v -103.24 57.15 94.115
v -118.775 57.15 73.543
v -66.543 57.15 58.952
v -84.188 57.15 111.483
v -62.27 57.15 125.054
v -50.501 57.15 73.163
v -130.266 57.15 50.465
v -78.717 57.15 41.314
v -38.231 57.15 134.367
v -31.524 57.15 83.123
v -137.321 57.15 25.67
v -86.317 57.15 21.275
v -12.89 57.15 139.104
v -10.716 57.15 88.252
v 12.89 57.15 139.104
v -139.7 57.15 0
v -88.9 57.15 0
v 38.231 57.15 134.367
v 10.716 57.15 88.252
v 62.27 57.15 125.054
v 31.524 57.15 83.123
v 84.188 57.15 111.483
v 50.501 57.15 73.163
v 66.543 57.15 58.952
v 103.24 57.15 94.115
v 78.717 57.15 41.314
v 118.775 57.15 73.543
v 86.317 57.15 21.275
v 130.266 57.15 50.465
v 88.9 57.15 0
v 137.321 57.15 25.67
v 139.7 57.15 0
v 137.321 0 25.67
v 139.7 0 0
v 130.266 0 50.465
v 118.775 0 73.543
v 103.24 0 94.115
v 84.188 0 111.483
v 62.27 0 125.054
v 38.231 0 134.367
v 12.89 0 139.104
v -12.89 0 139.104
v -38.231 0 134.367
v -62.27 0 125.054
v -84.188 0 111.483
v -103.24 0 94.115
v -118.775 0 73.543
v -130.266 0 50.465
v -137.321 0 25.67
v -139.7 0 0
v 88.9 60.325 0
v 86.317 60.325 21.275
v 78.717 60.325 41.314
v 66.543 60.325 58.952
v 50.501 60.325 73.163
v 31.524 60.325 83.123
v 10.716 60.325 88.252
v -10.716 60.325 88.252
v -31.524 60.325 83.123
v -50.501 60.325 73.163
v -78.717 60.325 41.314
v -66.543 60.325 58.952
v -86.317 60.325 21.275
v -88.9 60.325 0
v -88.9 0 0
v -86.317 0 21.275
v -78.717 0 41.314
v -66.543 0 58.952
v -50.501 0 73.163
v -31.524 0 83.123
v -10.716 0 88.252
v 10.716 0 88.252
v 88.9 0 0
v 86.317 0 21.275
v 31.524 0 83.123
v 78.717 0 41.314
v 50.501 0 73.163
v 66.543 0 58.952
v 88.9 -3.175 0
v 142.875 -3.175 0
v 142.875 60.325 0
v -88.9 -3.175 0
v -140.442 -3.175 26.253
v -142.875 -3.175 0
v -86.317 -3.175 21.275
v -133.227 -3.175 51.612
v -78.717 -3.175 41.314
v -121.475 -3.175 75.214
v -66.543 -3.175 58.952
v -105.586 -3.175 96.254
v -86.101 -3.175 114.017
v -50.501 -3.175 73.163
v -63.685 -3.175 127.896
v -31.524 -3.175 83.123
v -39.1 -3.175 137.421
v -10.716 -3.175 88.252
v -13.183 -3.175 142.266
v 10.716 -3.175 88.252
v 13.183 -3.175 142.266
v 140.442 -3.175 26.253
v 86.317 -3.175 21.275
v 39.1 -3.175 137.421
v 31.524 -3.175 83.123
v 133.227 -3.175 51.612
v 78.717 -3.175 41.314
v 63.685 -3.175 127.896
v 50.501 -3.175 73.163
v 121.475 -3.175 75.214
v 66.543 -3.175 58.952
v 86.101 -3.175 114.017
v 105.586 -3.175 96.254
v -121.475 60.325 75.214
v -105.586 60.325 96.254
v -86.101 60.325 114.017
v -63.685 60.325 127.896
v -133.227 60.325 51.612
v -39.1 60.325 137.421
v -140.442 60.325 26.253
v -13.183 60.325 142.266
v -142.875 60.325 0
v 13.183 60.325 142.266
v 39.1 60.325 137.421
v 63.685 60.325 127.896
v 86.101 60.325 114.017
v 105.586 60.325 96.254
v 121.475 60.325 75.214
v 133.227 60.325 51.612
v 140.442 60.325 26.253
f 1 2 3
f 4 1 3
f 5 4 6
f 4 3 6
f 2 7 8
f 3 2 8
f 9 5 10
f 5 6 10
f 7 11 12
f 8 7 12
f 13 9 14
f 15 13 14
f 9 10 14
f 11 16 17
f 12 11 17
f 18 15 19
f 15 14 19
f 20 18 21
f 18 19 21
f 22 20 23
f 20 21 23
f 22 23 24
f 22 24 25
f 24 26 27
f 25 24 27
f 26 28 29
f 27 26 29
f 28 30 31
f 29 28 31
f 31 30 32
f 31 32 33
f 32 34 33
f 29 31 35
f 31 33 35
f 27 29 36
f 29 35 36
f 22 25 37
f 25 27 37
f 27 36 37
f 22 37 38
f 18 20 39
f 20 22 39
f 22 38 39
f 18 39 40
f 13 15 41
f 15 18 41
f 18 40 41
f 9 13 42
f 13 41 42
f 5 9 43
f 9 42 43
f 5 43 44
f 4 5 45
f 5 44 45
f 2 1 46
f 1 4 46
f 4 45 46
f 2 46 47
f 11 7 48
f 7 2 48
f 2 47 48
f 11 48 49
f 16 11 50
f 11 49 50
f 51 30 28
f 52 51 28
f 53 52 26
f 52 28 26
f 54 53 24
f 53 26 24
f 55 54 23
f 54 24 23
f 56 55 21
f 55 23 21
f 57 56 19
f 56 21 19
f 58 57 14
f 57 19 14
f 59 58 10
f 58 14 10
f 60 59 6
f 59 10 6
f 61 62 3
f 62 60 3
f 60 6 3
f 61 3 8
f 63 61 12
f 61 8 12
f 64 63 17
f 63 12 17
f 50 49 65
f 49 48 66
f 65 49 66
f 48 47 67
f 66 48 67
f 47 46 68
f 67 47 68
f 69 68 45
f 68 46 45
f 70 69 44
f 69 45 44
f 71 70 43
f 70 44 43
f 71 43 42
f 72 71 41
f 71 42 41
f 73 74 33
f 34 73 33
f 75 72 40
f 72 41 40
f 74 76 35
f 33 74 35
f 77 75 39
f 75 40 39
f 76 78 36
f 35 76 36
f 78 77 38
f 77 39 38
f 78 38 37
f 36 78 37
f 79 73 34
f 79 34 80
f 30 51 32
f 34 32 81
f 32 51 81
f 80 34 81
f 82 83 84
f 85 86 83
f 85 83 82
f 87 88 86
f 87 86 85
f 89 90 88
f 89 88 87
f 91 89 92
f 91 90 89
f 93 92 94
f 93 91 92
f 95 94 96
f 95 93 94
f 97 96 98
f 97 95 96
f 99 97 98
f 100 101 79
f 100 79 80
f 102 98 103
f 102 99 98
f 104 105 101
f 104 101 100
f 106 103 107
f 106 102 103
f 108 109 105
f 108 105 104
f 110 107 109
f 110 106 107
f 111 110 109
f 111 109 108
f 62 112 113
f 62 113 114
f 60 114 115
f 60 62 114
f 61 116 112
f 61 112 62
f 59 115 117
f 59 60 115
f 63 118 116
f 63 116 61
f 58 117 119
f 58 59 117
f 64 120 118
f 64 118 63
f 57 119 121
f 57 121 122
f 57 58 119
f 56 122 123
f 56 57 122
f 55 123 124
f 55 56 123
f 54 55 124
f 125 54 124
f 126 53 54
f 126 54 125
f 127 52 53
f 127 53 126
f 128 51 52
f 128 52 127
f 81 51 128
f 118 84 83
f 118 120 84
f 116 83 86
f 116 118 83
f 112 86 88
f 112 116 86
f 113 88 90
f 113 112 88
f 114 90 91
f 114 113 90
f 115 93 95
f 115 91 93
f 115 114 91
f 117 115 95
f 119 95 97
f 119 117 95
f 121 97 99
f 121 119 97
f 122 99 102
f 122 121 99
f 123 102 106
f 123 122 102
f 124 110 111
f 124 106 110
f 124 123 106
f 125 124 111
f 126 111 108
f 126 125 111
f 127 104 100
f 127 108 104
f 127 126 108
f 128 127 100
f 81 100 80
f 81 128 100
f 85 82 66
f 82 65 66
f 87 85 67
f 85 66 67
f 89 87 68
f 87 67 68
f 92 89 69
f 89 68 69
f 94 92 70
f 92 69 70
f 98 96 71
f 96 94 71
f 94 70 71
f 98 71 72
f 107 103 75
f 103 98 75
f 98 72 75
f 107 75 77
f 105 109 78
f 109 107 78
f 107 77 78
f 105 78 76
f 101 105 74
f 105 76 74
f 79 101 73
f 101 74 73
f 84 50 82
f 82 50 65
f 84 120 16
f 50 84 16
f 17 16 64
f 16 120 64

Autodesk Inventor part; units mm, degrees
ref_plane "YZ Plane" through (0, 0, 0) normal (1, 0, 0) x (0, 1, 0)
ref_plane "XZ Plane" through (0, 0, 0) normal (0, 1, 0) x (-1, 0, 0)
ref_plane "XY Plane" through (0, 0, 0) normal (0, 0, 1) x (1, 0, 0)
sketch "Sketch1" plane through (0, 0, 0) normal (0, 1, 0) x (-1, 0, 0)
  arc A0 (139.7, 0) -> (-139.7, 0) centre (0, 0) ccw
  arc A1 (142.875, 0) -> (-142.875, 0) centre (0, 0) ccw
  line L0 (139.7, 0) -> (142.875, 0)
  line L1 (-139.7, 0) -> (-142.875, 0)
  dimension "d0" = 279.4
  dimension "d1" = 3.175
extrude "Extrusion1" add sketch "Sketch1" along normal blind 57.15
sketch "Sketch2" plane through (0, 57.15, 0) normal (0, 1, 0) x (1, 0, 0)
  arc A0 (-88.9, 0) -> (88.9, 0) centre (0, 0) ccw
  arc A1 (-142.875, 0) -> (142.875, 0) centre (0, 0) ccw projected
  line L0 (-139.7, 0) -> (-142.875, 0) projected
  line L1 (-142.875, 0) -> (-88.9, 0)
  line L2 (88.9, 0) -> (142.875, 0)
  dimension "d4" = 177.8
extrude "Extrusion2" add sketch "Sketch2" along normal blind 3.175
sketch "Sketch3" plane through (0, 0, 0) normal (0, -1, 0) x (1, 0, 0)
  arc A0 (142.875, 0) -> (-142.875, 0) centre (0, 0) ccw projected
  arc A1 (88.9, 0) -> (-88.9, 0) centre (0, 0) ccw projected
  line L0 (-139.7, 0) -> (-88.9, 0) projected
  line L1 (88.9, 0) -> (139.7, 0) projected
  line L2 (139.7, 0) -> (142.875, 0) projected
  line L3 (-142.875, 0) -> (-139.7, 0) projected
extrude "Extrusion3" add sketch "Sketch3" along normal blind 3.175
sketch "Sketch4" plane through (0, 60.325, 0) normal (0, 1, 0) x (1, 0, 0)
  line L0 (-88.9, 0) -> (-142.875, 0) projected
  line L1 (142.875, 0) -> (88.9, 0) projected
  point P0 (0, 0)
properties part number "Holster"
